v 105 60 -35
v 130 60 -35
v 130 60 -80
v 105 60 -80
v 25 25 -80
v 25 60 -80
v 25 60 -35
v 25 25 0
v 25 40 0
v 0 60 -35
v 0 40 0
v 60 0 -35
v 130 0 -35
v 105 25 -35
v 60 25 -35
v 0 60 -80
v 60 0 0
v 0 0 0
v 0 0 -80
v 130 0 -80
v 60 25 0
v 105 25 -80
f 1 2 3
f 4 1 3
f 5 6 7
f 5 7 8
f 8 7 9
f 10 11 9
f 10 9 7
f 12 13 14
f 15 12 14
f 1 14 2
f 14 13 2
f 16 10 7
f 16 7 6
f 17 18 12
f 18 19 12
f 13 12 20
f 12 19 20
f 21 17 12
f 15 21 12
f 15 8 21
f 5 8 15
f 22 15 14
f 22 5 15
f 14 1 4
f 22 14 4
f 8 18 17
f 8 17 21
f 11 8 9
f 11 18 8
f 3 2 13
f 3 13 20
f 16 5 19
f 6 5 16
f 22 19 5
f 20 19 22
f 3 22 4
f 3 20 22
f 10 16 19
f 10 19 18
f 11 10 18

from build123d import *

# Parameters (mm, degrees)
BOSS_EXTRUDE1_DEPTH = 25
BOSS_EXTRUDE2_DEPTH = 25
SKETCH3_W           = 45
SKETCH3_H           = 35
BOSS_EXTRUDE3_DEPTH = 25


with BuildPart() as part:
    # Sketch1 → Boss-Extrude1 (new body)
    with BuildSketch(Plane(origin=(0, 0, 0), x_dir=(1, 0, 0), z_dir=(0, 1, 0))):
        Polygon((0, 0), (60, 0), (60, 35), (130, 35), (130, 80), (0, 80), align=None)
    extrude(amount=BOSS_EXTRUDE1_DEPTH)

    # Sketch2 → Boss-Extrude2 (add)
    with BuildSketch(Plane.ZY):
        Polygon((0, 40), (-35, 60), (-80, 60), (-80, 25), (0, 25), align=None)
    extrude(amount=-BOSS_EXTRUDE2_DEPTH)

    # Sketch3 → Boss-Extrude3 (add)
    with BuildSketch(Plane(origin=(130, 0, 0), x_dir=(0, 0, -1), z_dir=(1, 0, 0))):
        with Locations((57.5, 42.5)):
            Rectangle(SKETCH3_W, SKETCH3_H)
    extrude(amount=-BOSS_EXTRUDE3_DEPTH)


solid = part.part
